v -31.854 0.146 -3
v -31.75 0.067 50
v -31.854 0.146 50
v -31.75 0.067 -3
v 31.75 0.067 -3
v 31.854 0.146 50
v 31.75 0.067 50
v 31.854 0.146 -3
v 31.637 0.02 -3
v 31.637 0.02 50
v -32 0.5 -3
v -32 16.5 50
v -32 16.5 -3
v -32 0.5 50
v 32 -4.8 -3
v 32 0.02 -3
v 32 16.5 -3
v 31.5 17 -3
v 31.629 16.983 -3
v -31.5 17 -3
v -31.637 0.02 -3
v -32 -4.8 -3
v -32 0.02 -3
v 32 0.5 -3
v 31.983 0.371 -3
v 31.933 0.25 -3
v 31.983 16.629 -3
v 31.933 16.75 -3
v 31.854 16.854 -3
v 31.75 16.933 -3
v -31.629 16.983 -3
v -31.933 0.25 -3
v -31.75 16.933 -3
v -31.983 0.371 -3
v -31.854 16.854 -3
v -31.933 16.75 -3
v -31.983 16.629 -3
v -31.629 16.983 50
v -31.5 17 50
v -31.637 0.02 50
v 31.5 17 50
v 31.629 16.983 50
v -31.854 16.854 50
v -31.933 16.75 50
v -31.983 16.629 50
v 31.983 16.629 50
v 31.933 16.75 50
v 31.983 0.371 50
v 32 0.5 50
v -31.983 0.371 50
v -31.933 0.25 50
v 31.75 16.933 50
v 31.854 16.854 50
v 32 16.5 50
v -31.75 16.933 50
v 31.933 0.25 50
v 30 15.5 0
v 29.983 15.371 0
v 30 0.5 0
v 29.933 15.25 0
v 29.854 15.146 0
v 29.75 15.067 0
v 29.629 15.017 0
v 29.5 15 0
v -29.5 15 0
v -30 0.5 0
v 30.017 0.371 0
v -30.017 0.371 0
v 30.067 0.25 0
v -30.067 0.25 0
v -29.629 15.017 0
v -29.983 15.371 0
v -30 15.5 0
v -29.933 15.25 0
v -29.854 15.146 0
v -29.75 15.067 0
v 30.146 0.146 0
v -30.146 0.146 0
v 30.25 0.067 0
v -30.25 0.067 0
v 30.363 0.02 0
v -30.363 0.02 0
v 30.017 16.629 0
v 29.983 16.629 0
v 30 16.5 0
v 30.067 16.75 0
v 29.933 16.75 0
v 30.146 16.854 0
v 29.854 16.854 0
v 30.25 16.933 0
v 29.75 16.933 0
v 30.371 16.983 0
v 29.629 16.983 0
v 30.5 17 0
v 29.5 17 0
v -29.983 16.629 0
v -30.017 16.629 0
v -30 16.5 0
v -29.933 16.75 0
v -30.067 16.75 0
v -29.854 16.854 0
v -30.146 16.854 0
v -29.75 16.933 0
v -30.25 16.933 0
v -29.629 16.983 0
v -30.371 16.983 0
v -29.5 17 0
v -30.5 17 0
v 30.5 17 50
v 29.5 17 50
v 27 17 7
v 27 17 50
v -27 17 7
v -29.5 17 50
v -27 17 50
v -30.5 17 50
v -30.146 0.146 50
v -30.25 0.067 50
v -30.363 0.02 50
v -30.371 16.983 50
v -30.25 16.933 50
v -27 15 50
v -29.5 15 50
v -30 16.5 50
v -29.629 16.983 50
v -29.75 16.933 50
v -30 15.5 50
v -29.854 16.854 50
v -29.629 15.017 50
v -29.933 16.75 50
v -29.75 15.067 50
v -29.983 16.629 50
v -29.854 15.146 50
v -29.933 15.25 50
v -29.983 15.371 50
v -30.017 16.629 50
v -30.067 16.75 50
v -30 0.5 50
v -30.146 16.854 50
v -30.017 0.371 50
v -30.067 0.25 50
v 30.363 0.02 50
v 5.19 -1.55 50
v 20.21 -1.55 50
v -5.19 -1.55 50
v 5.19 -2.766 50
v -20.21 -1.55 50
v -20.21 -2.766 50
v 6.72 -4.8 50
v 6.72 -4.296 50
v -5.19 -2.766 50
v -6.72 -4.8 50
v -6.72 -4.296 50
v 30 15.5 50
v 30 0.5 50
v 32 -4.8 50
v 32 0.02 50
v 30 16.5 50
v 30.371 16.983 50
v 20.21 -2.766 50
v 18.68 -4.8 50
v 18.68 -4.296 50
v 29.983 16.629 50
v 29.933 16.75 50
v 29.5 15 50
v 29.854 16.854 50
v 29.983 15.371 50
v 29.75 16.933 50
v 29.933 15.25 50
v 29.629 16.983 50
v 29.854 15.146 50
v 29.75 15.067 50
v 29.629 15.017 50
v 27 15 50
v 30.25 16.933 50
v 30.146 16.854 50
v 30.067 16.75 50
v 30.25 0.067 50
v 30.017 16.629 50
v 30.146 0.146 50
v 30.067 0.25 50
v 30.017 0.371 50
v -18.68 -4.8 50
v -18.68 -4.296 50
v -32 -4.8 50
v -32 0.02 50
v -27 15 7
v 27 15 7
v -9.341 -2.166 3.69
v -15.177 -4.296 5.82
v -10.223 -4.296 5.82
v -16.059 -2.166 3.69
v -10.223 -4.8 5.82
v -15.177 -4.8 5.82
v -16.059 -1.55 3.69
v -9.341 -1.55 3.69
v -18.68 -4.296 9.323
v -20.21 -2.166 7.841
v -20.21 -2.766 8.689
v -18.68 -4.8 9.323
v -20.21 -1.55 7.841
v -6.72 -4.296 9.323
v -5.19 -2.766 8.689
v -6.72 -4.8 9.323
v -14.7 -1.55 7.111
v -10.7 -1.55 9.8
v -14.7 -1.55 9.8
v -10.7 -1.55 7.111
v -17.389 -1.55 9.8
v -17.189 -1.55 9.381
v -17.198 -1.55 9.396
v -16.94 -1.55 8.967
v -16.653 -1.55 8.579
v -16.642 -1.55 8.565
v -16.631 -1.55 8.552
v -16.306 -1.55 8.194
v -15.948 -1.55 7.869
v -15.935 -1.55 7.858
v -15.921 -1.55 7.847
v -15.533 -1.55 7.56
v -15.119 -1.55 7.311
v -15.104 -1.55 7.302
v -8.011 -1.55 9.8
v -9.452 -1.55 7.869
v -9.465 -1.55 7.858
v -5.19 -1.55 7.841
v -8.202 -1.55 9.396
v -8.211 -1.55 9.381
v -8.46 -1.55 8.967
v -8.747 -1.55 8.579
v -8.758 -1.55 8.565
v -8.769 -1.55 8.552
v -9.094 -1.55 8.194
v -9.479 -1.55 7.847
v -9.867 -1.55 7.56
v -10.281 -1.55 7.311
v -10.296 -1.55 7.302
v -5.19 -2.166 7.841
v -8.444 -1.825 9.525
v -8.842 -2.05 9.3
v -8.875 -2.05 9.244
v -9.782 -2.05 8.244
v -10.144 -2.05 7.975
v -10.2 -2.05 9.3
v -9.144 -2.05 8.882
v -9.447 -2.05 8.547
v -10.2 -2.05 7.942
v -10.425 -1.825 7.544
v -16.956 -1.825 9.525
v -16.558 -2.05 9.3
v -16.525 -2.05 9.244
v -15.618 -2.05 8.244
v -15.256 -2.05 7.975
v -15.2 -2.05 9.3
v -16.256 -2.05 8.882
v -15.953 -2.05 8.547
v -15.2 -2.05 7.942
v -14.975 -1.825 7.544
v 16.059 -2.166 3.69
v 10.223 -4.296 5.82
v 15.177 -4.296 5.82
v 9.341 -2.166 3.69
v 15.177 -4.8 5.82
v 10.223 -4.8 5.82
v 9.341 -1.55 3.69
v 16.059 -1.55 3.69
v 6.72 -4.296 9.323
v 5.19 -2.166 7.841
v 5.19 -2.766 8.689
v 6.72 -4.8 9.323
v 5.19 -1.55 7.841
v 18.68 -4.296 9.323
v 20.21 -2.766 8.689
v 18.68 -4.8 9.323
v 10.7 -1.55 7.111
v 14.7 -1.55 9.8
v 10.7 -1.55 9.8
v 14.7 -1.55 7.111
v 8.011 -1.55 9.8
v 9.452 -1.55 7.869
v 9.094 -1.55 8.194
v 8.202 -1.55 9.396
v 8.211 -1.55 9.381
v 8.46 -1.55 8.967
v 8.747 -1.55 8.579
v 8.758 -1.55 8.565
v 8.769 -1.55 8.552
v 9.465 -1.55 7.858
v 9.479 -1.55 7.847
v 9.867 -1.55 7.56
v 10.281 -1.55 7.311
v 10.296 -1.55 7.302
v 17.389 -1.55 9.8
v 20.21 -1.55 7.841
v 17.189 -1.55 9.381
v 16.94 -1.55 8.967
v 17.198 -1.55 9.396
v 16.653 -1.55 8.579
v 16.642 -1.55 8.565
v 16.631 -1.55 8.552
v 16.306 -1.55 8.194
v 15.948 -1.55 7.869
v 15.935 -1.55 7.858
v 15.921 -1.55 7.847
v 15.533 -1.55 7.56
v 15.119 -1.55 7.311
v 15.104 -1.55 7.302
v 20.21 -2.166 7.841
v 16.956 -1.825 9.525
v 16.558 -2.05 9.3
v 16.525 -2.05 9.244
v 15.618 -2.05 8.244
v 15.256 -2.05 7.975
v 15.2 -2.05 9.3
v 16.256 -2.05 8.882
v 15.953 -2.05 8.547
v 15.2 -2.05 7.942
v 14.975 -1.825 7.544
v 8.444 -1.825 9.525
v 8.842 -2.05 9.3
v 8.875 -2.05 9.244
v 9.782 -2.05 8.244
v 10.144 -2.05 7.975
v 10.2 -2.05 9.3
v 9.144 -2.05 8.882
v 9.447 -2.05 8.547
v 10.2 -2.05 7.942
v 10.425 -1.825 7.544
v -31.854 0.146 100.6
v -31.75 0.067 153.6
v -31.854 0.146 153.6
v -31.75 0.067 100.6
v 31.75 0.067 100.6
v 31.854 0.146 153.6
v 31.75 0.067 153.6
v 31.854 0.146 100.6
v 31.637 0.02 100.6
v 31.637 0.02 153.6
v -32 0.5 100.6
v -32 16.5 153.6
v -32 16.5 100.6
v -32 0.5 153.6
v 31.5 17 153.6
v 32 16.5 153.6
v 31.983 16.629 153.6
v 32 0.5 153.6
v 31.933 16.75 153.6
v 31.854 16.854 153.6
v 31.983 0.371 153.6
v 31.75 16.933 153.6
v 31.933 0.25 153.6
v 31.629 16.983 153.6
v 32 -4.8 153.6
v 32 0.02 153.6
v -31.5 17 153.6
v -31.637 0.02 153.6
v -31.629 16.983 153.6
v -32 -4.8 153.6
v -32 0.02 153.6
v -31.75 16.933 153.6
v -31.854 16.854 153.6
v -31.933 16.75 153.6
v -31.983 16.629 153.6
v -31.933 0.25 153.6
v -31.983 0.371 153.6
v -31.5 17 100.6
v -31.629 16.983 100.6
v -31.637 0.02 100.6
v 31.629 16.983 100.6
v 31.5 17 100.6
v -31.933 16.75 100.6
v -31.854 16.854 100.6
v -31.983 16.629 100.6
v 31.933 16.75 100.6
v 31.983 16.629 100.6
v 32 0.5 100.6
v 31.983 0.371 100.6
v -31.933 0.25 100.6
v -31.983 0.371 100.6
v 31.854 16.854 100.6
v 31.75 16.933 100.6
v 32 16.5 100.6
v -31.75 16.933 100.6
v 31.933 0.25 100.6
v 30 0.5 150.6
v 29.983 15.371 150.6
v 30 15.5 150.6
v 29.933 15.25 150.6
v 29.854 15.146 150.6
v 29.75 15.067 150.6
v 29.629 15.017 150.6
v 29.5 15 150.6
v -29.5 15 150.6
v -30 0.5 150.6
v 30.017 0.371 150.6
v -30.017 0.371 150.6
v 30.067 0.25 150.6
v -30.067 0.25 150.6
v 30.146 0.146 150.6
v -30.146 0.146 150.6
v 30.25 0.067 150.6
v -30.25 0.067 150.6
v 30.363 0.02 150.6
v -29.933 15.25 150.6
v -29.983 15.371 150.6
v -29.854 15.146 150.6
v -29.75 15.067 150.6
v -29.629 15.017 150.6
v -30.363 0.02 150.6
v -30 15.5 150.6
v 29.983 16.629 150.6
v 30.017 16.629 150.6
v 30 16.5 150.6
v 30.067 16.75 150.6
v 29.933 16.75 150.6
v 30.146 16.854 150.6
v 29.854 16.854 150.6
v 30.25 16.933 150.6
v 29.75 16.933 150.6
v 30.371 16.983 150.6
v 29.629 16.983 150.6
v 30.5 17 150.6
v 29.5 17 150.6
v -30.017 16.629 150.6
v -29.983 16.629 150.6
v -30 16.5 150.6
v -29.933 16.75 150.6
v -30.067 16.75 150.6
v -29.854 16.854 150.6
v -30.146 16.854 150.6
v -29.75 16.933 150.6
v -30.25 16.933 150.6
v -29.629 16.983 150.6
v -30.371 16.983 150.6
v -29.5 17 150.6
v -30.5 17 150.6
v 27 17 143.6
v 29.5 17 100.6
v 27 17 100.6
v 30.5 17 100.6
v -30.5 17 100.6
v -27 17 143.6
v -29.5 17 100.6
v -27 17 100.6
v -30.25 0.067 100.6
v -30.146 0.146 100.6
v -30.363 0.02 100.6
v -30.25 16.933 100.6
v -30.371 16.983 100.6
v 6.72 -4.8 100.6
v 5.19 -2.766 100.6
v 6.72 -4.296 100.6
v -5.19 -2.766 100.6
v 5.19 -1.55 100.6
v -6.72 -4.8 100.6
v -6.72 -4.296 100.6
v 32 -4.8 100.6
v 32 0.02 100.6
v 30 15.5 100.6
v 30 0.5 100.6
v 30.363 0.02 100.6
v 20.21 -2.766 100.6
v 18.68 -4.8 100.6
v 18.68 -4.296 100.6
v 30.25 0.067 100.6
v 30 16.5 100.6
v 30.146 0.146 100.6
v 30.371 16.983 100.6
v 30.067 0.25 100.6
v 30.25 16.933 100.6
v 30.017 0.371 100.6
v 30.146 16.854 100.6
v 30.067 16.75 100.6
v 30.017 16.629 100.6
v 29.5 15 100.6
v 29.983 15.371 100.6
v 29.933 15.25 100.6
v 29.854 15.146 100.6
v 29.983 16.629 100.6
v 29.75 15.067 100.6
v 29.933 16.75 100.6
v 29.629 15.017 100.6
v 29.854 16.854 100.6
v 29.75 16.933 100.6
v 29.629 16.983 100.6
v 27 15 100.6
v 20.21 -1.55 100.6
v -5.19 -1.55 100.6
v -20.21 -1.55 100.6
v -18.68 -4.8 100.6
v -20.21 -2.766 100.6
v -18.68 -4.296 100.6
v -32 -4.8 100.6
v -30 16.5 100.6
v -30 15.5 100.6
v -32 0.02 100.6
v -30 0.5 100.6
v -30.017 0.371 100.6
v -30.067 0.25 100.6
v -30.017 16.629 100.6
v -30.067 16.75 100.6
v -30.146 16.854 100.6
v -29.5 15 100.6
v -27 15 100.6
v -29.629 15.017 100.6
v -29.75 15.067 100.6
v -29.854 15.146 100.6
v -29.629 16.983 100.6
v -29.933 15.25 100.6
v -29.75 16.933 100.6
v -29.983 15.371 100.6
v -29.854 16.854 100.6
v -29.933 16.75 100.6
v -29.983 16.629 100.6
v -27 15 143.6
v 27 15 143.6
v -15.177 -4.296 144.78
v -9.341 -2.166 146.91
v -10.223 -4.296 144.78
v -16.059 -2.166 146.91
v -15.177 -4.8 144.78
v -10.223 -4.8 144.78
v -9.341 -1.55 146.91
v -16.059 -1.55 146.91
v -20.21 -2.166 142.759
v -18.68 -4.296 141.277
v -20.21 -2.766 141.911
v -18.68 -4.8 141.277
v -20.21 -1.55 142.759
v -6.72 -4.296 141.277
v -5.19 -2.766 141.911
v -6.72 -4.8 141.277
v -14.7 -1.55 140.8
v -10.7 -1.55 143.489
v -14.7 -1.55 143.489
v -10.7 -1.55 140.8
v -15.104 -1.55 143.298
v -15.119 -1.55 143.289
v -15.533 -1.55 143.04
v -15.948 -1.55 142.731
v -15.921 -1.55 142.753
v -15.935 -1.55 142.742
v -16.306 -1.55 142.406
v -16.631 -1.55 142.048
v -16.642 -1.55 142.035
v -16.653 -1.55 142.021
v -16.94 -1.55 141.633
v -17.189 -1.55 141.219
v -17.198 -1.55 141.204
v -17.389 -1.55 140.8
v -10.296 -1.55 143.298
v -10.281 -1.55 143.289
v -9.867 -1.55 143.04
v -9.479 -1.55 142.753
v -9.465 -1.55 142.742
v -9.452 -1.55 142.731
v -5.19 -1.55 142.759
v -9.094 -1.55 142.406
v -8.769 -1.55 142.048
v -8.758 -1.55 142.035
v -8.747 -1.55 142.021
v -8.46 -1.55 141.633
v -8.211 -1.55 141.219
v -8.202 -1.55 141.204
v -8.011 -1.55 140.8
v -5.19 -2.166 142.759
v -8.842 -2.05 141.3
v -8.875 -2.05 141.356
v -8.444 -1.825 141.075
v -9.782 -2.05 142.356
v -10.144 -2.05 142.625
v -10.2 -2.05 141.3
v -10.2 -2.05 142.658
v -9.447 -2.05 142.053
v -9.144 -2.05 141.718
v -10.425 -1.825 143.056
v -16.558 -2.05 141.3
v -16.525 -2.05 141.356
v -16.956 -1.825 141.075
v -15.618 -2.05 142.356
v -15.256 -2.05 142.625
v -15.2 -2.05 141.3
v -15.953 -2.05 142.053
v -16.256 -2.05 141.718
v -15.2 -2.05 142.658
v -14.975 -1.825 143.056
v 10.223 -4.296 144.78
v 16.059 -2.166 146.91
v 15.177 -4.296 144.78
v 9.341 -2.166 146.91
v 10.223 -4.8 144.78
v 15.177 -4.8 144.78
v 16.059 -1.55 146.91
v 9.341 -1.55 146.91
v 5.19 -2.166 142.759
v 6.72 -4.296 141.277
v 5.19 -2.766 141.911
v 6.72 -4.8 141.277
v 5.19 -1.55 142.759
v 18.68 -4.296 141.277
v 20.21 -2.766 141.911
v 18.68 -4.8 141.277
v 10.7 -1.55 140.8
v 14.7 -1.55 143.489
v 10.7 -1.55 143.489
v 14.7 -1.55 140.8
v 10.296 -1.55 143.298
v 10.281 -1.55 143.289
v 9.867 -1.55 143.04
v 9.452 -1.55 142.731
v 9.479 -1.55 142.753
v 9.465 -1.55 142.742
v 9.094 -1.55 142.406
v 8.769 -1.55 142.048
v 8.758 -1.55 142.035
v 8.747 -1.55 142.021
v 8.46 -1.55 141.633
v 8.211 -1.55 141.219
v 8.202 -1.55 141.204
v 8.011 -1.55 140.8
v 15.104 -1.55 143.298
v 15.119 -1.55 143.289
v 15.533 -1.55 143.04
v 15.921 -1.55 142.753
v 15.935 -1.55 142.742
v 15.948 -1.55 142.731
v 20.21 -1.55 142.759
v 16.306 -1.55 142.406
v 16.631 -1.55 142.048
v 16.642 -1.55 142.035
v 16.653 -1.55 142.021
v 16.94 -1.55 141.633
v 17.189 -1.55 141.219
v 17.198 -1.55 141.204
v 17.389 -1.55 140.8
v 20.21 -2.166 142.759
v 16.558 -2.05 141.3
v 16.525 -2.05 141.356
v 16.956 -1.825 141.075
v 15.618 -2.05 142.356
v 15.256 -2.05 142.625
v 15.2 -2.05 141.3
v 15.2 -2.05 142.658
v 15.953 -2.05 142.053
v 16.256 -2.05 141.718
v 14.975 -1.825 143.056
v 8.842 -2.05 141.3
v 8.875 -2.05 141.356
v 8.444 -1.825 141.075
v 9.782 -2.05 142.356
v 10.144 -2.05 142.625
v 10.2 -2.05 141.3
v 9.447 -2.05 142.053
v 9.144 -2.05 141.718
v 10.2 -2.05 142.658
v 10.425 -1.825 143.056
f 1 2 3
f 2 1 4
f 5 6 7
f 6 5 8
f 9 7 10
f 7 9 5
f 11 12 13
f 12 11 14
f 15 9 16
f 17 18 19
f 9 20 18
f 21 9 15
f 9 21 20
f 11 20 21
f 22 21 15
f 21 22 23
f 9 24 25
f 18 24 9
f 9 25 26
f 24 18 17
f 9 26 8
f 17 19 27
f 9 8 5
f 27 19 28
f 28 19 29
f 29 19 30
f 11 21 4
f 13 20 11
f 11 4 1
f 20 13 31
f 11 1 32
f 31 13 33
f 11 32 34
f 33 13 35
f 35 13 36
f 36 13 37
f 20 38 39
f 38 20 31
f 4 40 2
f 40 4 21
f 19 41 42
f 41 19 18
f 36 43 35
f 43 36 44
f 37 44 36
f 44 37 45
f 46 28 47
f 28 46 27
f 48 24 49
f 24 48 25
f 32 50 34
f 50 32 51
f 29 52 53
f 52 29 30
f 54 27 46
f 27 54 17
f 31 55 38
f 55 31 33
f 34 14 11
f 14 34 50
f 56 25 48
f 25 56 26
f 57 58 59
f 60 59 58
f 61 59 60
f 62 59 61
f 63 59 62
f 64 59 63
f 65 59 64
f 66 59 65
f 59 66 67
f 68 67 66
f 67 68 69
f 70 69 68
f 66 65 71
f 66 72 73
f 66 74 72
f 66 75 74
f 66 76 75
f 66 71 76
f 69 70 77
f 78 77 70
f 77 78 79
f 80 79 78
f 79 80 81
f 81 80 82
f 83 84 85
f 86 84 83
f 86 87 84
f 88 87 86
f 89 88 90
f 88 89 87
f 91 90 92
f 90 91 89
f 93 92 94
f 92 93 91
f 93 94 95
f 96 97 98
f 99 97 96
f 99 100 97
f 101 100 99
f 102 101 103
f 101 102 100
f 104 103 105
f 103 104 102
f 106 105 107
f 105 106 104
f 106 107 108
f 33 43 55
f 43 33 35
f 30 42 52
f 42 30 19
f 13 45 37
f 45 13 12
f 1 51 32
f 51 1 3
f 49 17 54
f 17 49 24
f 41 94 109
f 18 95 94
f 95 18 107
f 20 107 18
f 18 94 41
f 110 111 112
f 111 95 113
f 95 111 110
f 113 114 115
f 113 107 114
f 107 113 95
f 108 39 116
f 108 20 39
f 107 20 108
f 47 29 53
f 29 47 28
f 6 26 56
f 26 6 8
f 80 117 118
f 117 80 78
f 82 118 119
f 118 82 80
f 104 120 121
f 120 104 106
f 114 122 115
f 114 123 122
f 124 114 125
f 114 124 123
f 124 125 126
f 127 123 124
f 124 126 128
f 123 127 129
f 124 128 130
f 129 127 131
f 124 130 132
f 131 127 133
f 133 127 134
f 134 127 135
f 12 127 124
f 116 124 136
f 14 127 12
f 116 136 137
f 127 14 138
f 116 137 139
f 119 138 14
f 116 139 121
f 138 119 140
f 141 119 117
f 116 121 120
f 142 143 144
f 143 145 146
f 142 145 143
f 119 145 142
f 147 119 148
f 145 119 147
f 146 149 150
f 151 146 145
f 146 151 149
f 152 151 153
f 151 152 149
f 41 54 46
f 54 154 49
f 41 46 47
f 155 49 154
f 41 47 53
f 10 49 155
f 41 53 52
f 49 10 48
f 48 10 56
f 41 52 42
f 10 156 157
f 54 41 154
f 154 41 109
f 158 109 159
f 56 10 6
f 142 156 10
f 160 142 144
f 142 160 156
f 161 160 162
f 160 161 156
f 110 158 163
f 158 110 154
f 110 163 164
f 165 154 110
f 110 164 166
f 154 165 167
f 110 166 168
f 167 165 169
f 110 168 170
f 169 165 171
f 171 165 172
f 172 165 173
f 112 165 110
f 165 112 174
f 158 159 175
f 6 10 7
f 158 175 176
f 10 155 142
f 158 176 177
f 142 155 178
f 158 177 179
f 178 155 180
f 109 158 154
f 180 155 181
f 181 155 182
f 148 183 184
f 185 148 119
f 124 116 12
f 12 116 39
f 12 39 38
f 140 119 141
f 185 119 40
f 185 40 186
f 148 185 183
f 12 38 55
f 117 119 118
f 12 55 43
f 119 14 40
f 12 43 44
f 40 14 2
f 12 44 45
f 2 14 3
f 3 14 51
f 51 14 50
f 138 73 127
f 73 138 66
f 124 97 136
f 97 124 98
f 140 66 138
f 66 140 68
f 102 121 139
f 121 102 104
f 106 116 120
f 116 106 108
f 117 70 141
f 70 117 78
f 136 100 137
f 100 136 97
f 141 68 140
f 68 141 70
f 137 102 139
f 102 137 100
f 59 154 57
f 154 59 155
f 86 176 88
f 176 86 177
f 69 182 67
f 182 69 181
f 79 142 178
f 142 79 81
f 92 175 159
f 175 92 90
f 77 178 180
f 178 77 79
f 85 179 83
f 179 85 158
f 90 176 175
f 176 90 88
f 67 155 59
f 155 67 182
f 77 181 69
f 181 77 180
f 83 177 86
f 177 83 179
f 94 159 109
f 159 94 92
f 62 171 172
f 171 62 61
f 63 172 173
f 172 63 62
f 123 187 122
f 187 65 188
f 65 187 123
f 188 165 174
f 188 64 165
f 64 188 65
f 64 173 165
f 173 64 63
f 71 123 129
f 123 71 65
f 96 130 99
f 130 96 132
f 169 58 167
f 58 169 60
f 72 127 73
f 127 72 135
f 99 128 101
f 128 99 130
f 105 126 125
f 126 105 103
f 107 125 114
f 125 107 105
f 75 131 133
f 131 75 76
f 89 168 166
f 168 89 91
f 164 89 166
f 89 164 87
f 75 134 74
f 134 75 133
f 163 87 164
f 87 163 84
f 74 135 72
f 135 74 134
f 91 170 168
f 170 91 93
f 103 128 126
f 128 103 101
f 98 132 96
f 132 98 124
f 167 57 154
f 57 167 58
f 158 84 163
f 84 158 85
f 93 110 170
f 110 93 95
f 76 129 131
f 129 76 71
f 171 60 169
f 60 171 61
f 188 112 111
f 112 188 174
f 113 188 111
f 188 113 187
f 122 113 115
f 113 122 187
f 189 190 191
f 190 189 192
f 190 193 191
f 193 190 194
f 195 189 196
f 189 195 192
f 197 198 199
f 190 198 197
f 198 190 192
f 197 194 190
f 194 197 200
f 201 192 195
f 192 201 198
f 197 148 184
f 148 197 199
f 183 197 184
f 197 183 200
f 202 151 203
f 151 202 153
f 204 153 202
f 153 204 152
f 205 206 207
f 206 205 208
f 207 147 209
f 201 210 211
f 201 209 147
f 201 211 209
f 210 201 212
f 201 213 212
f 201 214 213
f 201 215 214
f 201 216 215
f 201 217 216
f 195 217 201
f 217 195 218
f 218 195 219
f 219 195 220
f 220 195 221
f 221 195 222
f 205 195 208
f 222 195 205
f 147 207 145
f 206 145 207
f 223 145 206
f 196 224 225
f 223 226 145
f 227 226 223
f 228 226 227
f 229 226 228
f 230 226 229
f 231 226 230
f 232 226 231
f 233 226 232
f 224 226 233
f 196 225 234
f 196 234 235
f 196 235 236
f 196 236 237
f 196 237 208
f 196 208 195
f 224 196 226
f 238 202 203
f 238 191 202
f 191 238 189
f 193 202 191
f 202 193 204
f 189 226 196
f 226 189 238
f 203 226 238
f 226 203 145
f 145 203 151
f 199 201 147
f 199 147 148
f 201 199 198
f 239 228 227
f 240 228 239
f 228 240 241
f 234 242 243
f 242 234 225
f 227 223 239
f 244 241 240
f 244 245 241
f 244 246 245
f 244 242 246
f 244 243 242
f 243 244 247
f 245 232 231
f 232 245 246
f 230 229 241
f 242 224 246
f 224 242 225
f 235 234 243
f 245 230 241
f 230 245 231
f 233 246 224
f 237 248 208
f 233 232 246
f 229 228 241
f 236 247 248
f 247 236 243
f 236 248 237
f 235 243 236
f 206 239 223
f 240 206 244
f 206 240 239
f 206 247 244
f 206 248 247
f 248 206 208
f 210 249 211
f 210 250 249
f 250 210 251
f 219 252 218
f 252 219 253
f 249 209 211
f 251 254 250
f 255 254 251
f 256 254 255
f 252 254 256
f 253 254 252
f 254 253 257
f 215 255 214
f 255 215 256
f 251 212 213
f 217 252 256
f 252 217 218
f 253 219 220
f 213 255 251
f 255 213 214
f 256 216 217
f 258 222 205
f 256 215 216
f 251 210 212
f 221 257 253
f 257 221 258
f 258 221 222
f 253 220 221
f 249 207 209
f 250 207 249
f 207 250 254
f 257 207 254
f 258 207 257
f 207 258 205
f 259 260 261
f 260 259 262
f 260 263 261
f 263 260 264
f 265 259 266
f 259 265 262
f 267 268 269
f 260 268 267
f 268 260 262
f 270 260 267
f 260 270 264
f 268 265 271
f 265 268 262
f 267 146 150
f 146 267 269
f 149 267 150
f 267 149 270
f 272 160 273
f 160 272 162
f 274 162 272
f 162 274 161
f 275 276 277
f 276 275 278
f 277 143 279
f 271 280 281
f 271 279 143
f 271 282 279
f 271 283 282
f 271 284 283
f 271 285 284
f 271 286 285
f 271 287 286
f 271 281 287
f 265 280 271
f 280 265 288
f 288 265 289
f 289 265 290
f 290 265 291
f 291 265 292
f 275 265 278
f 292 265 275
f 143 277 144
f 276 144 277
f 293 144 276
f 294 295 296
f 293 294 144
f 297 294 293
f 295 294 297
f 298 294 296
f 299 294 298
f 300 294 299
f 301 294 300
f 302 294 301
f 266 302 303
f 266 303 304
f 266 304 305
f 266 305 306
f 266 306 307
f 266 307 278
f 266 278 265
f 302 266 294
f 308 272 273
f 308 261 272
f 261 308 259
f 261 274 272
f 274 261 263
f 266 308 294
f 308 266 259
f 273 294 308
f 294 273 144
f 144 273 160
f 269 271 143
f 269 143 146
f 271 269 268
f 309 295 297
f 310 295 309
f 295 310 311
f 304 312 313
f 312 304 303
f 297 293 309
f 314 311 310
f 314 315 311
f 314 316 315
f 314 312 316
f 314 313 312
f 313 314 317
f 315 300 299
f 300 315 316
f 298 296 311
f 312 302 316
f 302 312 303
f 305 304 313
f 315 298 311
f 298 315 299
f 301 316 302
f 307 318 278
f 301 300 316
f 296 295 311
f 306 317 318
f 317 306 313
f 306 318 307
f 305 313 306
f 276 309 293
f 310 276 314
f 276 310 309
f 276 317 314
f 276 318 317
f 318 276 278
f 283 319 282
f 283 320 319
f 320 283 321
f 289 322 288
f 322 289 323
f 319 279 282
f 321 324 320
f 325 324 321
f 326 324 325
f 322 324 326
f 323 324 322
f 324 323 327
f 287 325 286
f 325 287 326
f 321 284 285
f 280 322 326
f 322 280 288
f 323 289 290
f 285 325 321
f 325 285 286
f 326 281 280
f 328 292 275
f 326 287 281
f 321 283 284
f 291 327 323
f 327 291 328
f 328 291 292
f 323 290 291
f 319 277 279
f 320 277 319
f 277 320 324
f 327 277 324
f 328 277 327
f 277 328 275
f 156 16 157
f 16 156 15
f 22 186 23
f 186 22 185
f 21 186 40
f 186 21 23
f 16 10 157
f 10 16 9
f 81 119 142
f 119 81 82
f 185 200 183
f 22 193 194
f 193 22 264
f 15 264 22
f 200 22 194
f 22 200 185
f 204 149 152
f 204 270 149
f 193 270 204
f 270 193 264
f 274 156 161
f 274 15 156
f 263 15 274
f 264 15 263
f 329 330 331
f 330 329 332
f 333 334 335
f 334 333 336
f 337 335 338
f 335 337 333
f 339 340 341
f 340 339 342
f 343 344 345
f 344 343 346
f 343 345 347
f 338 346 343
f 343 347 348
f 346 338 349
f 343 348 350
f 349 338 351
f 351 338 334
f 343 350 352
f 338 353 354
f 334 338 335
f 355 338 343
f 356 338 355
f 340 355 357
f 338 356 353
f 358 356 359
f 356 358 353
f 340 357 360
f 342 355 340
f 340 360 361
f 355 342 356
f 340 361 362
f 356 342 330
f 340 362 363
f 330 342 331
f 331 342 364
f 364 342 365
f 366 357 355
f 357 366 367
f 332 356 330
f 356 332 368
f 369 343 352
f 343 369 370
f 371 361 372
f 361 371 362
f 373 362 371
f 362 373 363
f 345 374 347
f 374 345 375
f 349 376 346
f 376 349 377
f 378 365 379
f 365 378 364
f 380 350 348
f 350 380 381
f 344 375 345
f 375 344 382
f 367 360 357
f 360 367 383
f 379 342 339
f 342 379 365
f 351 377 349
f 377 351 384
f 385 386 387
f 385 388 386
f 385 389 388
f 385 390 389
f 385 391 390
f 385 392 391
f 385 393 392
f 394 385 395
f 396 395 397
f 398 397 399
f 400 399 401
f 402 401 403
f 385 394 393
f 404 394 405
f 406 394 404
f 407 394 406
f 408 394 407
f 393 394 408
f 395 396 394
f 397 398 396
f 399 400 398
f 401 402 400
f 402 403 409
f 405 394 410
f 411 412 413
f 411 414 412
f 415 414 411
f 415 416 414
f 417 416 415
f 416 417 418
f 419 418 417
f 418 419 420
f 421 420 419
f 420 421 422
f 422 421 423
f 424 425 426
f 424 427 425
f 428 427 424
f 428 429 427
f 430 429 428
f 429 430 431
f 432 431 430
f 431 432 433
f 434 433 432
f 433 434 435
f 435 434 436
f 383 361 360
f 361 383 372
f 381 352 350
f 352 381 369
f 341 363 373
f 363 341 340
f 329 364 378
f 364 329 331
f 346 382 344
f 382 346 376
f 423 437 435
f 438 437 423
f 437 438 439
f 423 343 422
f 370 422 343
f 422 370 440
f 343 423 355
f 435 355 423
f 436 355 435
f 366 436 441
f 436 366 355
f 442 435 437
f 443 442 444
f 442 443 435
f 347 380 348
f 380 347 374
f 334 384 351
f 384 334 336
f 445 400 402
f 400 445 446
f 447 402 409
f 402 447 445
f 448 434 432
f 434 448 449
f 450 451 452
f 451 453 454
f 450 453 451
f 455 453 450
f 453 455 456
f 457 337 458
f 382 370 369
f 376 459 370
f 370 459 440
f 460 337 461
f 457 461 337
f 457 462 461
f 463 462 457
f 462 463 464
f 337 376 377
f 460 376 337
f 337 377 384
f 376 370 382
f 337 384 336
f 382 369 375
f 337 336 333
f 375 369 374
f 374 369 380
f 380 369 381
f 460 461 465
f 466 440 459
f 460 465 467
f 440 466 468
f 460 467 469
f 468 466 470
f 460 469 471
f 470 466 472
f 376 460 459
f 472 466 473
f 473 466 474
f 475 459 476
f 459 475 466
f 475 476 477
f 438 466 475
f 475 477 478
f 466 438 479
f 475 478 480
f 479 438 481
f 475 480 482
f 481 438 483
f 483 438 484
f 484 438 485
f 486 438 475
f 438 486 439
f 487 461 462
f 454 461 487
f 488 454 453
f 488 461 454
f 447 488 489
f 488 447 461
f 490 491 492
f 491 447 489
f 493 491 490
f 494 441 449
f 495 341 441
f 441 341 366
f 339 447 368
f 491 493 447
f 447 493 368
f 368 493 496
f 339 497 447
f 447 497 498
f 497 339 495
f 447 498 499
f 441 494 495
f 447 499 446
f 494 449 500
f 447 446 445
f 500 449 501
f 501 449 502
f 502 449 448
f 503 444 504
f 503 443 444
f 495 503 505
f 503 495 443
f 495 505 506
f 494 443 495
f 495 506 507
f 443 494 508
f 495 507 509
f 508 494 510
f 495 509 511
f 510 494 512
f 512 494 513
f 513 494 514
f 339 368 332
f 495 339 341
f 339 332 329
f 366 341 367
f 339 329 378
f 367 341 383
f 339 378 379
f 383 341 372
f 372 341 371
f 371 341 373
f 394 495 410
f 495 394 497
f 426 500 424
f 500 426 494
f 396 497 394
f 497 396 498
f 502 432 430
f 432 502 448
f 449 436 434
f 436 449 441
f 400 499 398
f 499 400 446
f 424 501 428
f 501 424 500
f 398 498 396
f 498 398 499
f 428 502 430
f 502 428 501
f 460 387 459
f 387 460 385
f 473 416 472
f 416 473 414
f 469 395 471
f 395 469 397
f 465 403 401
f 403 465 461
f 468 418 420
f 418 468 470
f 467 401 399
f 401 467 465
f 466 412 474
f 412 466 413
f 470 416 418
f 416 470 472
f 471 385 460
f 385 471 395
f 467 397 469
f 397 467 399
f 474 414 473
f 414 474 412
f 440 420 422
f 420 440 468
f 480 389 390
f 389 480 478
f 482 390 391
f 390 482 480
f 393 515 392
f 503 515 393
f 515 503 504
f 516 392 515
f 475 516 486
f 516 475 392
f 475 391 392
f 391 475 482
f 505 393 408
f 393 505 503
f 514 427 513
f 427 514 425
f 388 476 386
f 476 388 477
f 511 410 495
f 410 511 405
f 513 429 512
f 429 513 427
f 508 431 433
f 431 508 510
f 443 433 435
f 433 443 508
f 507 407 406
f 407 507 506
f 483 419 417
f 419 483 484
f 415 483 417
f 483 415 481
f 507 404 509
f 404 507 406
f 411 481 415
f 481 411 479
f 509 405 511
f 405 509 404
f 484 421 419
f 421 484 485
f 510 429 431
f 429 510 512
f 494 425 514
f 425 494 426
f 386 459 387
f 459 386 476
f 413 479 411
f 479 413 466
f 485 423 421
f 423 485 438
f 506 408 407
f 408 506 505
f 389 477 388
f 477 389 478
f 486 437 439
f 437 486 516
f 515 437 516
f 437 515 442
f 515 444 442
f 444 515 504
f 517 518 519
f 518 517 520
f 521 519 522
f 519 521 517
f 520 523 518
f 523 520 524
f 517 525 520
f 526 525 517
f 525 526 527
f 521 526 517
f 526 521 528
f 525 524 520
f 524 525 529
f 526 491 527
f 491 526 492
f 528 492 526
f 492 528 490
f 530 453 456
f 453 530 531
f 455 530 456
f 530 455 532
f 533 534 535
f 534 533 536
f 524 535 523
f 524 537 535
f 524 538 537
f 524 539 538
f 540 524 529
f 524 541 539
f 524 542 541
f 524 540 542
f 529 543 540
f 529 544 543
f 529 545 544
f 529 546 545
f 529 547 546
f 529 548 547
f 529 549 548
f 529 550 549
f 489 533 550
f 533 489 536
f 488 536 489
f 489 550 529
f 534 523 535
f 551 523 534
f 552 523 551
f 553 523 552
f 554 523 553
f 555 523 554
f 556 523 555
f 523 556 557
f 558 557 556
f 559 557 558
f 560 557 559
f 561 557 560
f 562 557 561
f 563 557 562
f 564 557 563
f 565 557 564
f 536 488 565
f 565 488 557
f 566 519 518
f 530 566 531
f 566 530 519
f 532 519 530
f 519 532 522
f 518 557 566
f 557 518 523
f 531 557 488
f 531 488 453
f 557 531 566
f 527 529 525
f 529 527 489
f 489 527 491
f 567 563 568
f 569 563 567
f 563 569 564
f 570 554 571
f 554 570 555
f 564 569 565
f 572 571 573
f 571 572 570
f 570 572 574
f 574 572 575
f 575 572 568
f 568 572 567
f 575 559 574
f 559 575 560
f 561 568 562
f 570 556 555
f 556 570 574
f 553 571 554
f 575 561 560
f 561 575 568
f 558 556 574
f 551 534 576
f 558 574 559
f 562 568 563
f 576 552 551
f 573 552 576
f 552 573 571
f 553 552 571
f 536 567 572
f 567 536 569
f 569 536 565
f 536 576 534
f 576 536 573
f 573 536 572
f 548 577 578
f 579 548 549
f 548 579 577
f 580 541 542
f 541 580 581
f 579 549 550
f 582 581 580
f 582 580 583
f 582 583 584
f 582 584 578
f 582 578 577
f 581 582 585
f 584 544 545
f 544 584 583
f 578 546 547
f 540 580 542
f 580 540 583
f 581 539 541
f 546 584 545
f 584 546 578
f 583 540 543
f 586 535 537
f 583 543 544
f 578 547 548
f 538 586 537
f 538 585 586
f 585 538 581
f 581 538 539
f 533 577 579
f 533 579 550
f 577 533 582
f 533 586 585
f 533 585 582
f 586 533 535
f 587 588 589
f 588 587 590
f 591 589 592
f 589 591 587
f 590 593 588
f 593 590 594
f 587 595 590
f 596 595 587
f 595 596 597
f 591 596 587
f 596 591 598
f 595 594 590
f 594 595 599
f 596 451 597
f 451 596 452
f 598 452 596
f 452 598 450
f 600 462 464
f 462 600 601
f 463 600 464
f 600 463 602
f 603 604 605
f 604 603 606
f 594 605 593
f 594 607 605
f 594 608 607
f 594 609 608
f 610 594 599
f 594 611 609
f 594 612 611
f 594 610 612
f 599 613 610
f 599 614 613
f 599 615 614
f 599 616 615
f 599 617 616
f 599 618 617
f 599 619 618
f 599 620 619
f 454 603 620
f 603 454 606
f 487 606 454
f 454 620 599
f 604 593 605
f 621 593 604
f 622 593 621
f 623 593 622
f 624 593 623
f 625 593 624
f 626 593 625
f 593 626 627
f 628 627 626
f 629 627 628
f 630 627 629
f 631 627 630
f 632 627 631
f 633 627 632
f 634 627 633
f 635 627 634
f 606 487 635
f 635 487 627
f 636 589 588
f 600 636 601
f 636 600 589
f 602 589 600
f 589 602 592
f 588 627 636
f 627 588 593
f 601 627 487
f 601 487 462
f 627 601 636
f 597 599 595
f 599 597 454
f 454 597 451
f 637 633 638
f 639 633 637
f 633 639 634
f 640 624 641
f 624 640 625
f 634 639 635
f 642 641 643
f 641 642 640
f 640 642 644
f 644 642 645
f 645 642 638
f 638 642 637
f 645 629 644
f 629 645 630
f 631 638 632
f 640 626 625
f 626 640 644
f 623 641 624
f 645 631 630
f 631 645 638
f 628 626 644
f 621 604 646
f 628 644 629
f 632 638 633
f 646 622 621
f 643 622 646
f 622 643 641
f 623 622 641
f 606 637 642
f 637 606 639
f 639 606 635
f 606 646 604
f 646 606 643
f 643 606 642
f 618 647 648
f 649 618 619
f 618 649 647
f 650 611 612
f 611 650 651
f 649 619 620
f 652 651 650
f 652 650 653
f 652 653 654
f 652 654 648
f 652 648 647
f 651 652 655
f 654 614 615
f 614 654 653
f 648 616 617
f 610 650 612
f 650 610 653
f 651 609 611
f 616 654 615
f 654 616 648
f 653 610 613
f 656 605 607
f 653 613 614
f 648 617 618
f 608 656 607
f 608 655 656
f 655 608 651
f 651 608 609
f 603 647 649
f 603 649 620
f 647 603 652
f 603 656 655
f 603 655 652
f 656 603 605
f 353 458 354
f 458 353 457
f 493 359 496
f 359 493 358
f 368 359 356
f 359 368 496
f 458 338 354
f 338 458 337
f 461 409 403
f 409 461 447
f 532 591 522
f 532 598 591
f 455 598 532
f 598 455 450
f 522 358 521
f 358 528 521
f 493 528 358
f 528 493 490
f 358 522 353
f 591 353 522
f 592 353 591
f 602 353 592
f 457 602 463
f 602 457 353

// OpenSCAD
/*
Extension lead holder with 1-inch Pegboard Click rail slots.

Based on Andy Levesque's Underware made-to-measure holder, licensed
Creative Commons 4.0 Attribution-NonCommercial-ShareAlike.
Rail channel measurements and locking profile are carried over from the
Multibin shelf adaptation in this workspace.

Self-contained OpenSCAD source: no external libraries are required.
Units are millimetres.
*/

/* [Internal Dimensions] */
Internal_Depth = 50.0;  // Z: usable depth
Internal_Width = 60.0;  // X: usable width
Internal_Height = 15.0; // Y: usable thickness

/* [Holder Style] */
wallThickness = 2;
baseThickness = 3;
edgeRounding = 0.5; // XY-edge rounding

/* [Front Cutout] */
frontCutout = true;
frontLowerCapture = 7;
frontUpperCapture = 0;
frontLateralCapture = 3;

/* [Bottom Cutout] */
bottomCutout = false;
bottomFrontCapture = 3;
bottomBackCapture = 3;
bottomSideCapture = 3;

/* [Cord Cutout] */
cordCutout = false;
cordCutoutDiameter = 10;
cordCutoutLateralOffset = 0;
cordCutoutDepthOffset = 0;

/* [Right Cutout] */
rightCutout = false;
rightLowerCapture = 7;
rightUpperCapture = 0;
rightLateralCapture = 3;

/* [Left Cutout] */
leftCutout = false;
leftLowerCapture = 7;
leftUpperCapture = 0;
leftLateralCapture = 3;

/* [Clamshell Mode] */
ClamShell_Mode = true;
total_item_width = 150;
item_slop = 0.3;
Minimum_Safe_Mount_Clearance_From_Edge = 13;

/* [Rail Slots] */
// False: vertical channels at 25.4 mm spacing across X.
// True: horizontal channels at 25.4 mm spacing across Z.
Rotate_Rail_Slots_90_Degrees = false;
// Vertical: true opens at the top, false opens at the bottom.
// Horizontal: true opens at the right, false opens at the left.
Slot_From_Top = true;
// Closed-end offset when clamshell mode is disabled.
Rail_Stop_Distance_From_Edge = 13;
// Clearance PER SIDE around the measured Pegboard Click rail.
railSlotClearance = 0.11; // [0.05:0.01:0.4]
railRecessDepth = 0.80;   // [0:0.05:0.9]
railLockClearance = 0.10; // [0.05:0.05:0.2]
railEndClearance = 2;
slotQuickRelease = false;

/* [Backer] */
Backer_Only_Mode = false;
Force_Back_Thickness = 0; // 0 uses the measured 4.8 mm rail back

/* [Hidden] */
epsilon = 0.02;
railPitch = 25.4;
totalDepth = Backer_Only_Mode ? Internal_Depth : Internal_Depth+baseThickness;
totalWidth = Backer_Only_Mode ? Internal_Width : Internal_Width+2*wallThickness;
backThickness = Force_Back_Thickness == 0 ? 4.8 : Force_Back_Thickness;
railSlotInset = railRecessDepth;
railBumpProjection = 0.6-railLockClearance;

mountingWorkSpace = total_item_width+2*baseThickness+2*item_slop-
                    2*Minimum_Safe_Mount_Clearance_From_Edge;
mountPointDistance = floor(mountingWorkSpace/railPitch)*railPitch;
clamshellStopDistance = (total_item_width-mountPointDistance+
                         2*item_slop+2*baseThickness)/2;
slotStopDistance = ClamShell_Mode ? clamshellStopDistance :
                   Rail_Stop_Distance_From_Edge;

assert(Internal_Depth >= 0 && Internal_Width >= 0 && Internal_Height >= 0,
       "Internal dimensions must be nonnegative.");
assert(wallThickness >= 0 && baseThickness >= 0,
       "Wall and base thicknesses must be nonnegative.");
assert(backThickness >= 3.9,
       "The measured rail channel needs a back at least 3.9 mm thick.");
assert(railSlotClearance >= 0.05 && railSlotClearance <= 0.4,
       "Rail slot clearance must be between 0.05 and 0.4 mm.");
assert(railLockClearance >= 0.05 && railLockClearance <= 0.2,
       "Rail lock clearance must be between 0.05 and 0.2 mm.");
assert(railRecessDepth >= 0 && railRecessDepth <= 0.9,
       "Rail recess depth must be between 0 and 0.9 mm.");
assert(railEndClearance >= 0.5,
       "Allow at least 0.5 mm beyond the seated rail.");
assert((Rotate_Rail_Slots_90_Degrees ? totalWidth : totalDepth) >=
       slotStopDistance+33+railEndClearance,
       str("The 41 mm rail needs at least ",
           slotStopDistance+33+railEndClearance,
           " mm along the channel direction."));

echo(rail_pitch_mm=railPitch,
     rail_orientation=Rotate_Rail_Slots_90_Degrees ? "horizontal" : "vertical",
     rail_stop_distance_mm=slotStopDistance);

holder();
if(ClamShell_Mode)
    translate([0,0,total_item_width+2*item_slop])
        mirror([0,0,1]) holder();

module holder() {
    union() {
        if(!Backer_Only_Mode)
            translate([-Internal_Width/2,0,0]) basket();
        railBack();
    }
}

module basket() {
    difference() {
        union() {
            translate([-wallThickness,0,-baseThickness])
                roundedXYBox([Internal_Width+2*wallThickness,
                              Internal_Height+wallThickness,
                              baseThickness],edgeRounding);
            translate([-wallThickness,0,0])
                roundedXYBox([wallThickness,Internal_Height+wallThickness,
                              Internal_Depth],edgeRounding);
            translate([Internal_Width,0,0])
                roundedXYBox([wallThickness,Internal_Height+wallThickness,
                              Internal_Depth],edgeRounding);
            translate([0,Internal_Height,0])
                roundedXYBox([Internal_Width,wallThickness,Internal_Depth],
                             edgeRounding);
        }

        if(frontCutout)
            translate([frontLateralCapture,Internal_Height-epsilon,
                       frontLowerCapture])
                cube([Internal_Width-2*frontLateralCapture,
                      wallThickness+2*epsilon,
                      Internal_Depth-frontLowerCapture-frontUpperCapture+epsilon]);
        if(bottomCutout)
            translate([bottomSideCapture,bottomBackCapture,-baseThickness-epsilon])
                cube([Internal_Width-2*bottomSideCapture,
                      Internal_Height-bottomFrontCapture-bottomBackCapture,
                      baseThickness+2*epsilon]);
        if(rightCutout)
            translate([-wallThickness-epsilon,rightLateralCapture,
                       rightLowerCapture])
                cube([wallThickness+2*epsilon,
                      Internal_Height-2*rightLateralCapture,
                      Internal_Depth-rightLowerCapture-rightUpperCapture+epsilon]);
        if(leftCutout)
            translate([Internal_Width-epsilon,leftLateralCapture,
                       leftLowerCapture])
                cube([wallThickness+2*epsilon,
                      Internal_Height-2*leftLateralCapture,
                      Internal_Depth-leftLowerCapture-leftUpperCapture+epsilon]);
        if(cordCutout)
            translate([Internal_Width/2+cordCutoutLateralOffset,
                       Internal_Height/2+cordCutoutDepthOffset,
                       -baseThickness-epsilon]) {
                cylinder(h=baseThickness+frontLowerCapture+2*epsilon,
                         r=cordCutoutDiameter/2,$fn=48);
                translate([-cordCutoutDiameter/2,0,0])
                    cube([cordCutoutDiameter,Internal_Height/2+wallThickness+epsilon,
                          baseThickness+frontLowerCapture+2*epsilon]);
            }
    }
}

module roundedXYBox(size,r) {
    rr = min(max(r,0),min(size[0],size[1])/2-0.001);
    if(rr <= 0)
        cube(size);
    else
        linear_extrude(height=size[2])
            translate([rr,rr]) offset(r=rr,$fn=24)
                square([size[0]-2*rr,size[1]-2*rr]);
}

module railBack() {
    backZ0 = -baseThickness;
    patternSpan = Rotate_Rail_Slots_90_Degrees ? totalDepth : totalWidth;
    slotCount = max(1,floor(patternSpan/railPitch));
    firstSlot = (patternSpan-(slotCount-1)*railPitch)/2;
    toolY = -2.35+railSlotInset;

    difference() {
        translate([-totalWidth/2,-backThickness,backZ0])
            cube([totalWidth,backThickness+epsilon,totalDepth]);

        for(i=[0:slotCount-1]) {
            p = firstSlot+i*railPitch;
            if(Rotate_Rail_Slots_90_Degrees) {
                z = backZ0+p;
                if(Slot_From_Top)
                    translate([-totalWidth/2+slotStopDistance,toolY,z])
                        rotate([0,-90,0]) pegboardRailSlotTool(totalWidth);
                else
                    translate([totalWidth/2-slotStopDistance,toolY,z])
                        rotate([0,90,0]) pegboardRailSlotTool(totalWidth);
            } else {
                x = -totalWidth/2+p;
                if(Slot_From_Top)
                    translate([x,toolY,backZ0+slotStopDistance])
                        rotate([0,180,0]) pegboardRailSlotTool(totalDepth);
                else
                    translate([x,toolY,backZ0+totalDepth-slotStopDistance])
                        pegboardRailSlotTool(totalDepth);
            }
        }
    }
}

module pegboardRailSlotTool(length) {
    difference() {
        pegboardRailChannel(length);
        if(!slotQuickRelease) pegboardRailBumps();
    }
}

module pegboardRailChannel(length) {
    c = railSlotClearance;
    d = 1.216152;
    cutDepth = 2.5+railSlotInset;
    taperEnd = min(cutDepth,2.746152);
    profile = [[0,0],[7.4+c,0],[7.4+c,d],
               [7.4+c-(taperEnd-d),taperEnd],
               [7.4+c-(taperEnd-d),cutDepth],[0,cutDepth]];

    module guide(guideLength) {
        rotate([180,0,0]) linear_extrude(height=guideLength)
            union() {
                polygon(profile);
                mirror([1,0,0]) polygon(profile);
            }
    }

    union() {
        guide(length+1);
        intersection() {
            scale([1/sin(67.5),1,1/sin(67.5)])
                rotate([90,67.5,0])
                    rotate_extrude($fn=8)
                        polygon([[0,0],[8+c,0],[8+c,0.616152],
                                 [8+c-(taperEnd-0.616152),taperEnd],
                                 [8+c-(taperEnd-0.616152),cutDepth],[0,cutDepth]]);
            translate([0,0,10]) guide(20);
        }
    }
}

module pegboardRailBumps() {
    for(side=[-1,1]) scale([side,1,1])
        rotate([90,0,0]) intersection() {
            r = 5.2-railLockClearance;
            a = 1.9+railLockClearance;
            p = railBumpProjection;
            translate([0,0,-epsilon])
                cylinder(h=p+epsilon,r1=r+epsilon,r2=r-p,$fn=64);
            railLoftSection(
                [[a-epsilon,a-epsilon],[6,a-epsilon],[6,6],[a-epsilon,6]],
                [[a+p,a+p],[6,a+p],[6,6],[a+p,6]],-epsilon,p);
        }
}

module railLoftSection(bottom,top,z0,z1) {
    n = len(bottom);
    polyhedron(
        points=concat([for(p=bottom) [p[0],p[1],z0]],
                      [for(p=top) [p[0],p[1],z1]]),
        faces=concat([[for(i=[n-1:-1:0]) i]],
                     [[for(i=[0:n-1]) n+i]],
                     [for(i=[0:n-1]) [i,(i+1)%n,(i+1)%n+n,i+n]]),
        convexity=4);
}
